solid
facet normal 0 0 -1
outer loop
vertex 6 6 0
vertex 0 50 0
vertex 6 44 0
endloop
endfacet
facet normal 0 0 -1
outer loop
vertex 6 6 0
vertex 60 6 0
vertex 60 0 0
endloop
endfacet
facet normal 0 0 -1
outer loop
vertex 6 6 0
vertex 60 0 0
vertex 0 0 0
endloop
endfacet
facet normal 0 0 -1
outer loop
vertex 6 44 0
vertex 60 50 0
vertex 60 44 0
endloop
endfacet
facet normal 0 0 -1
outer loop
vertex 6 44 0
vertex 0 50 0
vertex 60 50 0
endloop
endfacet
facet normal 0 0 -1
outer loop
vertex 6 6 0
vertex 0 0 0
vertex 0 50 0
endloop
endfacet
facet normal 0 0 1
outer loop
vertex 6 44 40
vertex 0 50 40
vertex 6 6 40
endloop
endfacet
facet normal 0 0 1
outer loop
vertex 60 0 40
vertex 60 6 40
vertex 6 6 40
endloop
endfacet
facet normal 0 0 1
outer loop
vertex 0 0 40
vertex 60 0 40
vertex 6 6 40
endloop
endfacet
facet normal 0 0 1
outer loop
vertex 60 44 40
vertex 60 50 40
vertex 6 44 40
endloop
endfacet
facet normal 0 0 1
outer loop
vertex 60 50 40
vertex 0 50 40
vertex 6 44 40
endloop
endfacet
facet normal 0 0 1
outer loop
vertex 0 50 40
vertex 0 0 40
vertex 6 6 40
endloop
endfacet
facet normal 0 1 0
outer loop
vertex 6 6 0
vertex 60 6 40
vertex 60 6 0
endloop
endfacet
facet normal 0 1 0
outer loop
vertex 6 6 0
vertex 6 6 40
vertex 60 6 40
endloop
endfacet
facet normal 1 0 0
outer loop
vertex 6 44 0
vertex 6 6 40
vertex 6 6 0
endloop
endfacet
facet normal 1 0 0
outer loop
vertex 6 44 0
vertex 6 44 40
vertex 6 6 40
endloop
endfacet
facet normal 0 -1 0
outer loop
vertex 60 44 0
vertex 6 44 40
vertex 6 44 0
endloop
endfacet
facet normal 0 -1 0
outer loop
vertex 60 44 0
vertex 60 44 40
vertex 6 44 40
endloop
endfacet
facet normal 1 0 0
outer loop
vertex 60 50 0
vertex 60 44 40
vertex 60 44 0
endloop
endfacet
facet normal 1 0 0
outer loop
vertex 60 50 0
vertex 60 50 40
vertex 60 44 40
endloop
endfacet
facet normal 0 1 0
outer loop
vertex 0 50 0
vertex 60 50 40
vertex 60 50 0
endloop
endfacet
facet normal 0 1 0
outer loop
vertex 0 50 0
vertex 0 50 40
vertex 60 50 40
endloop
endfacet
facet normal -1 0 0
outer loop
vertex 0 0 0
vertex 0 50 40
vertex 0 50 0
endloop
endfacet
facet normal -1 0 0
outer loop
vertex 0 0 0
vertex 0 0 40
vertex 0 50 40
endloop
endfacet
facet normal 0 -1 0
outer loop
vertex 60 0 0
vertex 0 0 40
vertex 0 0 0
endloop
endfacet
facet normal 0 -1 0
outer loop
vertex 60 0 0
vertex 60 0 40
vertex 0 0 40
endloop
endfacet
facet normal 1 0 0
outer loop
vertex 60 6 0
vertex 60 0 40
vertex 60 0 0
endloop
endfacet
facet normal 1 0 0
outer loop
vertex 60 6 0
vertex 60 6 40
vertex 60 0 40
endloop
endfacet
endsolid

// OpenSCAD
$fn = 32;
// target_bbox: 60, 50, 40
// ----------------------------------------------------------------------
// Structural section: channel 60 x 50 mm
// ----------------------------------------------------------------------

// --- parameters (mm) ---
sec_w = 60;               // channel width, X
sec_h = 50;               // channel height, Y
flange_t = 6;             // flange thickness
web_t = 6;                // web thickness
plate_t = 40;             // cut length, Z (extrusion height)

profile = [[0, 0], [60, 0], [60, 6], [6, 6], [6, 44], [60, 44], [60, 50], [0, 50]];  // primary outline, 8 points, counter clockwise

// --- the one profile operation ---
linear_extrude(height = plate_t) polygon(points = profile);
